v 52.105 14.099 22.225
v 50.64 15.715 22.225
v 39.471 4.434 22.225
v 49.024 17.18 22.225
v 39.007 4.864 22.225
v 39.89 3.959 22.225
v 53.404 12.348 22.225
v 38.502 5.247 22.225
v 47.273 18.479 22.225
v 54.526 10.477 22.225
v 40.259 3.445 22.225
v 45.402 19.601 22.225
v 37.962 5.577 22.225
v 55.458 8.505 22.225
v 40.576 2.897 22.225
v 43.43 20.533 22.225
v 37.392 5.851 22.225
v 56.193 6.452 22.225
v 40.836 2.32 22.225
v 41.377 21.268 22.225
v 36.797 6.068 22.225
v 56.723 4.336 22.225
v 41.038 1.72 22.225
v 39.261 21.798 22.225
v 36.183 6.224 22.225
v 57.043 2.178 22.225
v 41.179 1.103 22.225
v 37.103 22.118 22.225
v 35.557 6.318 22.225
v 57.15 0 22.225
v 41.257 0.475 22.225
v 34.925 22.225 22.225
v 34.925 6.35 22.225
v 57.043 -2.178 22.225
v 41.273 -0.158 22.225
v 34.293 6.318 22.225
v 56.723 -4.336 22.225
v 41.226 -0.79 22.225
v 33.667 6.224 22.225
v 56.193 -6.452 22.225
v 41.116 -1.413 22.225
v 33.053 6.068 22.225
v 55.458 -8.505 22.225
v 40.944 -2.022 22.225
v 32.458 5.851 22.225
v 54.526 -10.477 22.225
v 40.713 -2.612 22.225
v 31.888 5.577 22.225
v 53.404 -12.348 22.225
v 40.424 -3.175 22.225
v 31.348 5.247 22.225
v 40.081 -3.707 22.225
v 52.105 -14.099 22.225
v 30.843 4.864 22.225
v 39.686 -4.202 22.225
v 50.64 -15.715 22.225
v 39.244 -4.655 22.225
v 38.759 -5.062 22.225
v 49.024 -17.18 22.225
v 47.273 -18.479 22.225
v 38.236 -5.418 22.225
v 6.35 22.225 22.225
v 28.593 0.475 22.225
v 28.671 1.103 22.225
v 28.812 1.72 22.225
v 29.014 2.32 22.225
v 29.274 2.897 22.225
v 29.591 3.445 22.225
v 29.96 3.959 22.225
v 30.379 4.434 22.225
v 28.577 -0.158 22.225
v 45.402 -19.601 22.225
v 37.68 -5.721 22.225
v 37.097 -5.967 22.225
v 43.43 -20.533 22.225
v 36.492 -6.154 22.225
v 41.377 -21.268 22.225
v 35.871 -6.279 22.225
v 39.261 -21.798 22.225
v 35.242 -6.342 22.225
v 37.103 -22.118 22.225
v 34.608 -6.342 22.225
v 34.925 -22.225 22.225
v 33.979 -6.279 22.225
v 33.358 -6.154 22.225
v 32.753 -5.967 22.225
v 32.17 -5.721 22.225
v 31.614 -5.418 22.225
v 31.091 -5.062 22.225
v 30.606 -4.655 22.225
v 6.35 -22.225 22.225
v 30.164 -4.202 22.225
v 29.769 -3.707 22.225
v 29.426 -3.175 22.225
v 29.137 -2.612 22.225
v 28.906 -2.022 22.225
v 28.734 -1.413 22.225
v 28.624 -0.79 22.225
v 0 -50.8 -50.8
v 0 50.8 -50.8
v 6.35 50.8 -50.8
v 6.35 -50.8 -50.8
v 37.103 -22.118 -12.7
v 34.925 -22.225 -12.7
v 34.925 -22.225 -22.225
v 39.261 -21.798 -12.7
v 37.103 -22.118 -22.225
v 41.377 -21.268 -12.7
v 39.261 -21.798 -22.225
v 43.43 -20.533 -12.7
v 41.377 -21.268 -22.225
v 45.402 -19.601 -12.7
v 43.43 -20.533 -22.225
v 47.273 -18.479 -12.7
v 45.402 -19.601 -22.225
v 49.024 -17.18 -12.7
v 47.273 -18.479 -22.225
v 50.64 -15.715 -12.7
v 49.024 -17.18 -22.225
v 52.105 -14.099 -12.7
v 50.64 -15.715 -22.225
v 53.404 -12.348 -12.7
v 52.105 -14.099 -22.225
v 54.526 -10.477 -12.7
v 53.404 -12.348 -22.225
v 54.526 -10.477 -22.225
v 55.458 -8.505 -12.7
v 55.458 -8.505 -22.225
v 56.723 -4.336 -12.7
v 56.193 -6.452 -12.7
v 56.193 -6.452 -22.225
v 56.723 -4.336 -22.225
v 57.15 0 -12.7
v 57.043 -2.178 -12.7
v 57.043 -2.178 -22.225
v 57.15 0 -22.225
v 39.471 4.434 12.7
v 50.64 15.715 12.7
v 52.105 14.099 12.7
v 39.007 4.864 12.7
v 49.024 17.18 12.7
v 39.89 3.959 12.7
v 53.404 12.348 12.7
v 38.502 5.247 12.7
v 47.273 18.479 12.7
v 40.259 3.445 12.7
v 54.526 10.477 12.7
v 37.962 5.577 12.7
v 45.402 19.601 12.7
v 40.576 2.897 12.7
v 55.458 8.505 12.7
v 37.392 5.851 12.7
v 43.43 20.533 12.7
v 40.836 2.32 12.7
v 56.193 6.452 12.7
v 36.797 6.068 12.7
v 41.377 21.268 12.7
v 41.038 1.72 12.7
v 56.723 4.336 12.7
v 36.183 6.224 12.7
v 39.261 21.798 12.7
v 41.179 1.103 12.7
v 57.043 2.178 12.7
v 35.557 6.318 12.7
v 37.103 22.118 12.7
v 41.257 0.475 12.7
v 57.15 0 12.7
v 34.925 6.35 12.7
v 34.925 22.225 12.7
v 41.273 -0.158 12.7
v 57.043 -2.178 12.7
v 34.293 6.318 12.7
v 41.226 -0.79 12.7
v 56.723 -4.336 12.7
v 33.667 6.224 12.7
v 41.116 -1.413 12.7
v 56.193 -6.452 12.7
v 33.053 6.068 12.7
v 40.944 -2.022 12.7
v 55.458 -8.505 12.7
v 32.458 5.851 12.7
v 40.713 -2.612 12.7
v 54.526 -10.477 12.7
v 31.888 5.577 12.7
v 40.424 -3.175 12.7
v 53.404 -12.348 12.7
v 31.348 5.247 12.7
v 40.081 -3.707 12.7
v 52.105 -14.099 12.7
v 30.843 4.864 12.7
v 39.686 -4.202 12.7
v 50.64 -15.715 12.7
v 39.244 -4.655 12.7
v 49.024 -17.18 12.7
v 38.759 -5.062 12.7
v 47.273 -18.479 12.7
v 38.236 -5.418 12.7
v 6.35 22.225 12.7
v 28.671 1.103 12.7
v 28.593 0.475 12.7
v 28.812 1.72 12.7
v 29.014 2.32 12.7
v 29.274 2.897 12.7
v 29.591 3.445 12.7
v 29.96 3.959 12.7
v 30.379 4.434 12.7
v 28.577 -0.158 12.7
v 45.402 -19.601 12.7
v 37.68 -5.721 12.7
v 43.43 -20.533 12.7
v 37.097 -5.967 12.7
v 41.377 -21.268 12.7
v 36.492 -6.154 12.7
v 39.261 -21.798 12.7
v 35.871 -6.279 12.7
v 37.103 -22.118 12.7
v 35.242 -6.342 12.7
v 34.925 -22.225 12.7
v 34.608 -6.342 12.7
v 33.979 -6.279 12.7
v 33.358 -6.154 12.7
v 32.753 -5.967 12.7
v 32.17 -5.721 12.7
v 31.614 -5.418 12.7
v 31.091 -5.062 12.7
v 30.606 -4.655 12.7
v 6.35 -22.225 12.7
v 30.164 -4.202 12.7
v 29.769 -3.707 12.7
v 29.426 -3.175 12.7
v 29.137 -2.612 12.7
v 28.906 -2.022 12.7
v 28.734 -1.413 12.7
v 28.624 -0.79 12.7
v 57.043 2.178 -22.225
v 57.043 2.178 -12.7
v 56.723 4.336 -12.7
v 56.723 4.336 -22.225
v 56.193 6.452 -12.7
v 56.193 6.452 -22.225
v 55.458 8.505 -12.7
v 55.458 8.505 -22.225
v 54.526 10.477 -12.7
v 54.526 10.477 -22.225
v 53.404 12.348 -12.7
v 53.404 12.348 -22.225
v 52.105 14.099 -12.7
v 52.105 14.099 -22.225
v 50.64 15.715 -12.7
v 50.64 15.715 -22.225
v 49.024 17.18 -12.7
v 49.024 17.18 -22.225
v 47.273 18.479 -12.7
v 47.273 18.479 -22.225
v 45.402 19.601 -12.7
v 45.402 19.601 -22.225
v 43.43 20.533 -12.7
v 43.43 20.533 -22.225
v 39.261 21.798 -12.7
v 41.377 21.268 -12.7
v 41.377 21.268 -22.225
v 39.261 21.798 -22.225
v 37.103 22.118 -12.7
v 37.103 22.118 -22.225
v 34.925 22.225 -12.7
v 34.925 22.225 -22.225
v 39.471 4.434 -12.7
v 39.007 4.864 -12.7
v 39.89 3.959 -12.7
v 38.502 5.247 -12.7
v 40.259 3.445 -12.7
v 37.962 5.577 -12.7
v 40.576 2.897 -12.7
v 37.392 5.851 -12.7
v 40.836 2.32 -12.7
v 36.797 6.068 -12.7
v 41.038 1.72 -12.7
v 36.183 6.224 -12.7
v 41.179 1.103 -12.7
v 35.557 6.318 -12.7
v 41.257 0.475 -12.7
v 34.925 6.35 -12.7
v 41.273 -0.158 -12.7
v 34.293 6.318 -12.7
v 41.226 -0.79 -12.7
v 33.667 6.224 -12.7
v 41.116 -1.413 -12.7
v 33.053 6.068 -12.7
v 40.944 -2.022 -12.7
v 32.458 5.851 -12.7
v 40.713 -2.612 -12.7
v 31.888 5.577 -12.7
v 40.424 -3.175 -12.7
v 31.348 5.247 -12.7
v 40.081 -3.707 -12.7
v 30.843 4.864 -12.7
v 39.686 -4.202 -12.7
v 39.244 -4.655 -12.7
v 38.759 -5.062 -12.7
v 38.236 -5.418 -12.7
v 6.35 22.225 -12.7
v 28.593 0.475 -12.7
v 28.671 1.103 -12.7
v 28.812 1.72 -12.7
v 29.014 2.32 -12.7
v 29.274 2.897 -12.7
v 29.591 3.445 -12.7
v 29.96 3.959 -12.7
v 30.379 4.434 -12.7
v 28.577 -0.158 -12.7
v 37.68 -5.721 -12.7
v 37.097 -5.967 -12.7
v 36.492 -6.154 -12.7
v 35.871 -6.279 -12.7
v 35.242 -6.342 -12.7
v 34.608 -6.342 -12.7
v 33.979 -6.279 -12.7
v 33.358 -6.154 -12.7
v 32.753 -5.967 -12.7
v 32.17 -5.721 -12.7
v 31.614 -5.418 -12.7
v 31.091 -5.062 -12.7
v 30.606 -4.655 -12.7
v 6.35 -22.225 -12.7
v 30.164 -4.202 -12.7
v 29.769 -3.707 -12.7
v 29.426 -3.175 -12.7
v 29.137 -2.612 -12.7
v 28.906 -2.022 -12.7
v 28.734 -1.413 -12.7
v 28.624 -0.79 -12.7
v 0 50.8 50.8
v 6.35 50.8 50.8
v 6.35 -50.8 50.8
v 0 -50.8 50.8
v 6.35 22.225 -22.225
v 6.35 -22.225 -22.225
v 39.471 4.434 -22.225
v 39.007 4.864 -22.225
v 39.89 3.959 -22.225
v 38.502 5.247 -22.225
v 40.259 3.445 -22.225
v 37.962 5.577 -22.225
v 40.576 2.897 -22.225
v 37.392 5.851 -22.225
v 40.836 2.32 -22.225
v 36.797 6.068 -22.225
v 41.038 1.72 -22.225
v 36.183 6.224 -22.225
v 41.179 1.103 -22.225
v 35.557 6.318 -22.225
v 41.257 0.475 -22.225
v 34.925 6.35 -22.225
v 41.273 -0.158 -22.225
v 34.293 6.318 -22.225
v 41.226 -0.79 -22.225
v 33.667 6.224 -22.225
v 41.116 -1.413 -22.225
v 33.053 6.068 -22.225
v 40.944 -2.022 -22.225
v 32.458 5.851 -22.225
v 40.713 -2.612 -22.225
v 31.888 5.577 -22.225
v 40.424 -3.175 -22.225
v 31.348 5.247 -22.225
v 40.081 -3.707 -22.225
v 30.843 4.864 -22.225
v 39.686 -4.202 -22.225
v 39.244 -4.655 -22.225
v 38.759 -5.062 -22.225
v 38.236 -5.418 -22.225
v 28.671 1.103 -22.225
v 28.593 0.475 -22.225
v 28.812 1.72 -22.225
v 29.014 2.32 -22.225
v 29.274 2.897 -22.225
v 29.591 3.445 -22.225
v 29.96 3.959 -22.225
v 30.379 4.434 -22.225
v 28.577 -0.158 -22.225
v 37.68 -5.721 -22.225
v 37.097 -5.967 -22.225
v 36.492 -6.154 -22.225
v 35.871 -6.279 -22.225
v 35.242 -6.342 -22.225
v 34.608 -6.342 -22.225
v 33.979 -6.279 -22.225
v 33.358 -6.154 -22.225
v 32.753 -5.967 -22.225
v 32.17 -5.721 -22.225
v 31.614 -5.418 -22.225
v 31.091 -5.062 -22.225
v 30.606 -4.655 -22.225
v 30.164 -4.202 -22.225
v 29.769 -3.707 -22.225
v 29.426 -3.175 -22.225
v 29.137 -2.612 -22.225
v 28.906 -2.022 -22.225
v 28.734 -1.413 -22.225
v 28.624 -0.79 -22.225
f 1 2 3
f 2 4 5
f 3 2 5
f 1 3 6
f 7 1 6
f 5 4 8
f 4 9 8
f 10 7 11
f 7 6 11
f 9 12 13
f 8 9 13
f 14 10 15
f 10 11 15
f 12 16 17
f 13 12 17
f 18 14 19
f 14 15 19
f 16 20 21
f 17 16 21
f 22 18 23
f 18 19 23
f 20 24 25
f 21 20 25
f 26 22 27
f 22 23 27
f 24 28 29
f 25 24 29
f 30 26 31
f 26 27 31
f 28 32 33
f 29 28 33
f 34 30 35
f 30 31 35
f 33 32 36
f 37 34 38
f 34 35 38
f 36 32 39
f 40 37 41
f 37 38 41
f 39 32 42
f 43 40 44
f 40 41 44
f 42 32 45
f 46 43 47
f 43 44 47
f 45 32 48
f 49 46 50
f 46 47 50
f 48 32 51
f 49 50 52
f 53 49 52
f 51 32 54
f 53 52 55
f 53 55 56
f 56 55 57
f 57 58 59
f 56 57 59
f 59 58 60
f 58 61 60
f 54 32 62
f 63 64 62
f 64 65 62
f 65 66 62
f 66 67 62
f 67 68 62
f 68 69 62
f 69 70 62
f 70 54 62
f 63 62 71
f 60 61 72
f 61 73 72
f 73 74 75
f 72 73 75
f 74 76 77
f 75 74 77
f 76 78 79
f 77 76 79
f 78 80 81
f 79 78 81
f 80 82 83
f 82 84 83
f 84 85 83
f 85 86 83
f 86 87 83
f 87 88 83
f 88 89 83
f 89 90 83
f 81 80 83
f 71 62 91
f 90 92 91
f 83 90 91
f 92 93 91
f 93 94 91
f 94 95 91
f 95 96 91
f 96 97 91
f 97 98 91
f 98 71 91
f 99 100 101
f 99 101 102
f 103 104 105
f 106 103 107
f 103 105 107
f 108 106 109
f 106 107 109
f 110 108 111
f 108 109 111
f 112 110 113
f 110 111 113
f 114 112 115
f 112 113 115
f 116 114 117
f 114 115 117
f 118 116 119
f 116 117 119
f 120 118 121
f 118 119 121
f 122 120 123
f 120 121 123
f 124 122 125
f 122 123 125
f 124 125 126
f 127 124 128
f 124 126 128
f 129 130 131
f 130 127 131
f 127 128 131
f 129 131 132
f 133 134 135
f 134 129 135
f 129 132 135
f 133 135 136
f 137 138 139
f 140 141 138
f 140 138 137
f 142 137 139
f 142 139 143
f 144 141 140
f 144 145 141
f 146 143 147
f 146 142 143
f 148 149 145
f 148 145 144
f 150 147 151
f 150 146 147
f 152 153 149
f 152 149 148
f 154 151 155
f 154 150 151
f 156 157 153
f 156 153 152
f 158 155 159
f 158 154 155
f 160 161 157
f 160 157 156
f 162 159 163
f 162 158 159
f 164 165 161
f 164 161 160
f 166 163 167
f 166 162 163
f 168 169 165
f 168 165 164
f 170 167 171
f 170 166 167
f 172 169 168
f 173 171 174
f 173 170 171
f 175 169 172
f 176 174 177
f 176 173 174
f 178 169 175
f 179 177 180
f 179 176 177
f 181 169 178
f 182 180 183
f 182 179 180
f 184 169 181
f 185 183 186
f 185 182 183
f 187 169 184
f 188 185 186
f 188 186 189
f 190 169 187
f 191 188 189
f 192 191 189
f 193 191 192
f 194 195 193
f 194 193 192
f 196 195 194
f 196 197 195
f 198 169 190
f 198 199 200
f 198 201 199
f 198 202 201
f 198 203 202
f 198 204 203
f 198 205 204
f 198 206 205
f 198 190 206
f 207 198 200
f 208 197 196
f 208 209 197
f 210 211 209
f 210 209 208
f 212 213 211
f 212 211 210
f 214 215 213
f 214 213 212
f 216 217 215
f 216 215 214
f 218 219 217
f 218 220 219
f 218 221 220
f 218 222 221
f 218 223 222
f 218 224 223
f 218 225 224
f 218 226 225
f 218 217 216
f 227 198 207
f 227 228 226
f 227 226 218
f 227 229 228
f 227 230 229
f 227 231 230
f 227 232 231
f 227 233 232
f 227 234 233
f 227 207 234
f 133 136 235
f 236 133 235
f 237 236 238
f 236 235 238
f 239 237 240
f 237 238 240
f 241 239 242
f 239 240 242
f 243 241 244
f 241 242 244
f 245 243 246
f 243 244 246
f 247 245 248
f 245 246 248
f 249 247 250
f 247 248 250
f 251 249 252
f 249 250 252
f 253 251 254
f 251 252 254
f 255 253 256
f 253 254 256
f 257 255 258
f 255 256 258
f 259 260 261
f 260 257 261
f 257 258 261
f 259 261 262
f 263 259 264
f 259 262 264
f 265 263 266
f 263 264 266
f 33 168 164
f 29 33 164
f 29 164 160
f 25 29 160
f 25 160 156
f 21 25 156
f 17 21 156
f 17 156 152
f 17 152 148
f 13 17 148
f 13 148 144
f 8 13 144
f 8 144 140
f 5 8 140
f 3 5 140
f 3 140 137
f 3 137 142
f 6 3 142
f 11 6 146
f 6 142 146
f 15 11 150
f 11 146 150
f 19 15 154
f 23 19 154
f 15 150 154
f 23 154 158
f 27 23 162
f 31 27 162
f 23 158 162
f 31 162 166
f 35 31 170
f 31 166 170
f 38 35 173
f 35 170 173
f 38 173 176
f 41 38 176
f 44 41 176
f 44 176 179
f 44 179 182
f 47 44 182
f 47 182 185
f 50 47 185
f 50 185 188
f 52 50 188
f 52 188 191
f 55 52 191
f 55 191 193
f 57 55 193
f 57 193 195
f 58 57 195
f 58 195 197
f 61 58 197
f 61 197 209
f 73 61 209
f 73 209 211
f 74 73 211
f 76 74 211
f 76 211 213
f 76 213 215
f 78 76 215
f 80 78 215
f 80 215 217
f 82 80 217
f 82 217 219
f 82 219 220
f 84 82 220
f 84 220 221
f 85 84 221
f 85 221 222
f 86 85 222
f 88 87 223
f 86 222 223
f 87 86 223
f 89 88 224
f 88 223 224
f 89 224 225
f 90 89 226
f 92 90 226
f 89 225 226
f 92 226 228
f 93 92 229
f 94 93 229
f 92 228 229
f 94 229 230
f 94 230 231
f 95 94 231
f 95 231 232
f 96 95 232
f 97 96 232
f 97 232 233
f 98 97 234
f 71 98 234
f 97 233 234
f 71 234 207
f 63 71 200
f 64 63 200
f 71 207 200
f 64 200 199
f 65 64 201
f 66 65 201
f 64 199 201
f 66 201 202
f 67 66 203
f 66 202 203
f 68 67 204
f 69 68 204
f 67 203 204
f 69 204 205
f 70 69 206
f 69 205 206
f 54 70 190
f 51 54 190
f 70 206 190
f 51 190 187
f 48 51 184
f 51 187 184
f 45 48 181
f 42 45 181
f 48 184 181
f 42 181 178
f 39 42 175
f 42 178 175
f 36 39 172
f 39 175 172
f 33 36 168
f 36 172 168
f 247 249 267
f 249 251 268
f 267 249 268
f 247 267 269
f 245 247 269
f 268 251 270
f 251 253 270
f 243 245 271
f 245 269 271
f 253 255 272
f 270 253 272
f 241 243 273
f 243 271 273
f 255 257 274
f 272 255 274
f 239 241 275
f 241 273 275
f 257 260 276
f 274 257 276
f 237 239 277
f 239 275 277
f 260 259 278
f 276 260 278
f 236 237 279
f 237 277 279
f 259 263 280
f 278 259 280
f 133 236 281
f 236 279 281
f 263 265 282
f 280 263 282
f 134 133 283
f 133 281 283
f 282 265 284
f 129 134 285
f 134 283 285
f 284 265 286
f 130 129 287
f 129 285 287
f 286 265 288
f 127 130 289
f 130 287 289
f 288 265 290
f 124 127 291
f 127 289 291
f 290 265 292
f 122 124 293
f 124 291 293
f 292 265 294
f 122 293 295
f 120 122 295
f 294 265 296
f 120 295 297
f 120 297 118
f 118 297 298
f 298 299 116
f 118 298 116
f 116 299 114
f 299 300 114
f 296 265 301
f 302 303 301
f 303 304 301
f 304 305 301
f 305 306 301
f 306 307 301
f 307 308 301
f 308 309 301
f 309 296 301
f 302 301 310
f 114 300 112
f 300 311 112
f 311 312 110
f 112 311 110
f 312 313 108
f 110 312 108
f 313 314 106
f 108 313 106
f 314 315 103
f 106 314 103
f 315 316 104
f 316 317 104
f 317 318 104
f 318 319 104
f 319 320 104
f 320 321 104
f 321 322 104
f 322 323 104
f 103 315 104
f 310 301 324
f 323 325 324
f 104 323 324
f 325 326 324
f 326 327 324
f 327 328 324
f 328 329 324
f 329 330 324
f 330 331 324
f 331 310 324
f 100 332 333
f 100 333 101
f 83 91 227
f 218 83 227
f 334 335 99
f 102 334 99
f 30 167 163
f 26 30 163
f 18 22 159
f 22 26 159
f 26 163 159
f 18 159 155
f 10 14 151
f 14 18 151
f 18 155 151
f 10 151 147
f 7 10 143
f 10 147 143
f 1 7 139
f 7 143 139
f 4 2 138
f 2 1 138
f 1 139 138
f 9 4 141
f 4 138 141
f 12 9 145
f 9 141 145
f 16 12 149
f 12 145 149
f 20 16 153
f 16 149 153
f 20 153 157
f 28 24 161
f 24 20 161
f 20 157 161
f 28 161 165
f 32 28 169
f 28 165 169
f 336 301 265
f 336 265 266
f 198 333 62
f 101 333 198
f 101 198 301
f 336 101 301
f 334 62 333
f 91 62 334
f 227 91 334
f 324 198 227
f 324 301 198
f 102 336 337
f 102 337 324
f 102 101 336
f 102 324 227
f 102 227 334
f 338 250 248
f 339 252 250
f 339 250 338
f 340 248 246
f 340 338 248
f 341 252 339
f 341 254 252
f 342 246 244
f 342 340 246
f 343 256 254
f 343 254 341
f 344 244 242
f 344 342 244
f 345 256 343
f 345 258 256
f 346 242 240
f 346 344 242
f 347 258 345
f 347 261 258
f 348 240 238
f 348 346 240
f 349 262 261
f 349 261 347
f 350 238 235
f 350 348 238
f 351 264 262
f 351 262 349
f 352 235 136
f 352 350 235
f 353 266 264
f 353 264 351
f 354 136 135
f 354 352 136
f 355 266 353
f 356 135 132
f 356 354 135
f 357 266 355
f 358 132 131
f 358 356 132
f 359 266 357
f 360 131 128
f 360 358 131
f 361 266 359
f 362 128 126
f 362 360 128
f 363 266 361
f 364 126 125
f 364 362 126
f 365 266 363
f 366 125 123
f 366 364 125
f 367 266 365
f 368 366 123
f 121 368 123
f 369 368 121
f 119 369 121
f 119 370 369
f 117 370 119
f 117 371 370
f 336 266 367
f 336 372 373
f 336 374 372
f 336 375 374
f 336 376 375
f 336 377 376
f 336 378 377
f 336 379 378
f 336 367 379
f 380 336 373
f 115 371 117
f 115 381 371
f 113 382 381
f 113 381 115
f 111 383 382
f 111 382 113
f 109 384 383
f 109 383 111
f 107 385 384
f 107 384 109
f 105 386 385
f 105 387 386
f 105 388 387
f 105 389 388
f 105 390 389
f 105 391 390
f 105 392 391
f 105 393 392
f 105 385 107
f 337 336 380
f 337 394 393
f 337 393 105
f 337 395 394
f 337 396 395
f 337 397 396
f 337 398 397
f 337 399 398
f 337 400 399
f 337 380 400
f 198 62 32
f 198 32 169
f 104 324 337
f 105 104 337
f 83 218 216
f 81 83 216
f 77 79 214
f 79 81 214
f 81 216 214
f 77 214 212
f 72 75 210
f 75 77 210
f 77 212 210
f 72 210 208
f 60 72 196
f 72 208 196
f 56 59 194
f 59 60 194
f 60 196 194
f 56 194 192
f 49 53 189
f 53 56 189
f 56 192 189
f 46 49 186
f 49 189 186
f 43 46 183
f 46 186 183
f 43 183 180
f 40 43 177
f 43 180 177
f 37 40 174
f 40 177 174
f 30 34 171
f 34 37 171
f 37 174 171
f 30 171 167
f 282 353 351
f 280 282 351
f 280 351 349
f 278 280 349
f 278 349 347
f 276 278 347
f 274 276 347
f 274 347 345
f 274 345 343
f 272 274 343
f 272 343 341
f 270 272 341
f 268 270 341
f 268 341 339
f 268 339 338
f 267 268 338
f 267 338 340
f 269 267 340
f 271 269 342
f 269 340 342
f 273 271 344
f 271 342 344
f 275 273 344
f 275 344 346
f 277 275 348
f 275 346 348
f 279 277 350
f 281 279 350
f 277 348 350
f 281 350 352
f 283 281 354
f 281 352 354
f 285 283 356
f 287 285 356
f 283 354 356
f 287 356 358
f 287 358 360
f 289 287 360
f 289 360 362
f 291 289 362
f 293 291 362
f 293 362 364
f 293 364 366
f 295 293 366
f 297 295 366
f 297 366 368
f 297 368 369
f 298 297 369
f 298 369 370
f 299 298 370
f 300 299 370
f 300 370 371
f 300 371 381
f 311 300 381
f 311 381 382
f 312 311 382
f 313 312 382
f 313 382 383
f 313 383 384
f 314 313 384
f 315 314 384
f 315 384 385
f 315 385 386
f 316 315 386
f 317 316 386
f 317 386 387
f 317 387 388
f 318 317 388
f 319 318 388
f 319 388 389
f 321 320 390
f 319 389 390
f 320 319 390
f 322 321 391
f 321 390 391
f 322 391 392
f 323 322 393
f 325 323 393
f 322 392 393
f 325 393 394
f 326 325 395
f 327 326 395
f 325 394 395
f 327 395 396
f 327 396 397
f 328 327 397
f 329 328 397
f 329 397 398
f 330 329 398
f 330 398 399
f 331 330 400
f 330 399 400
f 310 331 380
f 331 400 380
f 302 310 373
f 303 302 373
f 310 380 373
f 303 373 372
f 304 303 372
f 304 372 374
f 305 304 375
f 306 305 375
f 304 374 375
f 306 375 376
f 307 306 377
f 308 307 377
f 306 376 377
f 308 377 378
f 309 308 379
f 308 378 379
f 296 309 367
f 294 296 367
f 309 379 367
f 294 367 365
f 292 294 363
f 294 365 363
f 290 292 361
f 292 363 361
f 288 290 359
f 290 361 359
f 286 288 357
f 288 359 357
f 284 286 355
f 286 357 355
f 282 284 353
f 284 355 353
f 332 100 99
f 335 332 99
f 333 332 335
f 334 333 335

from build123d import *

# Parameters (mm, degrees)
SKETCH1_W           = 101.6
SKETCH1_H           = 101.6
BOSS_EXTRUDE1_DEPTH = 6.35
SKETCH2_W           = 44.45
SKETCH2_H           = 9.525
BOSS_EXTRUDE2_DEPTH = 50.8
SKETCH3_R           = 6.35
CUT_EXTRUDE1_DEPTH  = 74.025


with BuildPart() as part:
    # Sketch1 → Boss-Extrude1 (new body)
    with BuildSketch(Plane(origin=(0, 0, 0), x_dir=(0, -1, 0), z_dir=(1, 0, 0))):
        Rectangle(SKETCH1_W, SKETCH1_H)
    extrude(amount=BOSS_EXTRUDE1_DEPTH)

    # Sketch2 → Boss-Extrude2 (add)
    with BuildSketch(Plane(origin=(6.35, 0, 0), x_dir=(0, -1, 0), z_dir=(1, 0, 0))):
        with Locations((0, 17.4625)):
            Rectangle(SKETCH2_W, SKETCH2_H)
        with Locations((0, -17.4625)):
            Rectangle(SKETCH2_W, SKETCH2_H)
    extrude(amount=BOSS_EXTRUDE2_DEPTH)

    # Sketch3 → Cut-Extrude1 (cut, through all)
    with BuildSketch(Plane.YX.offset(22.225)):
        with BuildLine():
            Line((-22.225, 57.15), (-22.225, 34.925))
            ThreePointArc((-22.225, 34.925), (-15.715448108, 50.640448315), (2.93e-07, 57.15))
            Line((2.93e-07, 57.15), (-22.225, 57.15))
        make_face()
        with BuildLine():
            ThreePointArc((2.93e-07, 57.15), (15.715448315, 50.640448108), (22.225, 34.925))
            Line((22.225, 34.925), (22.225, 57.15))
            Line((22.225, 57.15), (2.93e-07, 57.15))
        make_face()
        with Locations((0, 34.925)):
            Circle(SKETCH3_R)
    extrude(amount=-CUT_EXTRUDE1_DEPTH, mode=Mode.SUBTRACT)


solid = part.part
